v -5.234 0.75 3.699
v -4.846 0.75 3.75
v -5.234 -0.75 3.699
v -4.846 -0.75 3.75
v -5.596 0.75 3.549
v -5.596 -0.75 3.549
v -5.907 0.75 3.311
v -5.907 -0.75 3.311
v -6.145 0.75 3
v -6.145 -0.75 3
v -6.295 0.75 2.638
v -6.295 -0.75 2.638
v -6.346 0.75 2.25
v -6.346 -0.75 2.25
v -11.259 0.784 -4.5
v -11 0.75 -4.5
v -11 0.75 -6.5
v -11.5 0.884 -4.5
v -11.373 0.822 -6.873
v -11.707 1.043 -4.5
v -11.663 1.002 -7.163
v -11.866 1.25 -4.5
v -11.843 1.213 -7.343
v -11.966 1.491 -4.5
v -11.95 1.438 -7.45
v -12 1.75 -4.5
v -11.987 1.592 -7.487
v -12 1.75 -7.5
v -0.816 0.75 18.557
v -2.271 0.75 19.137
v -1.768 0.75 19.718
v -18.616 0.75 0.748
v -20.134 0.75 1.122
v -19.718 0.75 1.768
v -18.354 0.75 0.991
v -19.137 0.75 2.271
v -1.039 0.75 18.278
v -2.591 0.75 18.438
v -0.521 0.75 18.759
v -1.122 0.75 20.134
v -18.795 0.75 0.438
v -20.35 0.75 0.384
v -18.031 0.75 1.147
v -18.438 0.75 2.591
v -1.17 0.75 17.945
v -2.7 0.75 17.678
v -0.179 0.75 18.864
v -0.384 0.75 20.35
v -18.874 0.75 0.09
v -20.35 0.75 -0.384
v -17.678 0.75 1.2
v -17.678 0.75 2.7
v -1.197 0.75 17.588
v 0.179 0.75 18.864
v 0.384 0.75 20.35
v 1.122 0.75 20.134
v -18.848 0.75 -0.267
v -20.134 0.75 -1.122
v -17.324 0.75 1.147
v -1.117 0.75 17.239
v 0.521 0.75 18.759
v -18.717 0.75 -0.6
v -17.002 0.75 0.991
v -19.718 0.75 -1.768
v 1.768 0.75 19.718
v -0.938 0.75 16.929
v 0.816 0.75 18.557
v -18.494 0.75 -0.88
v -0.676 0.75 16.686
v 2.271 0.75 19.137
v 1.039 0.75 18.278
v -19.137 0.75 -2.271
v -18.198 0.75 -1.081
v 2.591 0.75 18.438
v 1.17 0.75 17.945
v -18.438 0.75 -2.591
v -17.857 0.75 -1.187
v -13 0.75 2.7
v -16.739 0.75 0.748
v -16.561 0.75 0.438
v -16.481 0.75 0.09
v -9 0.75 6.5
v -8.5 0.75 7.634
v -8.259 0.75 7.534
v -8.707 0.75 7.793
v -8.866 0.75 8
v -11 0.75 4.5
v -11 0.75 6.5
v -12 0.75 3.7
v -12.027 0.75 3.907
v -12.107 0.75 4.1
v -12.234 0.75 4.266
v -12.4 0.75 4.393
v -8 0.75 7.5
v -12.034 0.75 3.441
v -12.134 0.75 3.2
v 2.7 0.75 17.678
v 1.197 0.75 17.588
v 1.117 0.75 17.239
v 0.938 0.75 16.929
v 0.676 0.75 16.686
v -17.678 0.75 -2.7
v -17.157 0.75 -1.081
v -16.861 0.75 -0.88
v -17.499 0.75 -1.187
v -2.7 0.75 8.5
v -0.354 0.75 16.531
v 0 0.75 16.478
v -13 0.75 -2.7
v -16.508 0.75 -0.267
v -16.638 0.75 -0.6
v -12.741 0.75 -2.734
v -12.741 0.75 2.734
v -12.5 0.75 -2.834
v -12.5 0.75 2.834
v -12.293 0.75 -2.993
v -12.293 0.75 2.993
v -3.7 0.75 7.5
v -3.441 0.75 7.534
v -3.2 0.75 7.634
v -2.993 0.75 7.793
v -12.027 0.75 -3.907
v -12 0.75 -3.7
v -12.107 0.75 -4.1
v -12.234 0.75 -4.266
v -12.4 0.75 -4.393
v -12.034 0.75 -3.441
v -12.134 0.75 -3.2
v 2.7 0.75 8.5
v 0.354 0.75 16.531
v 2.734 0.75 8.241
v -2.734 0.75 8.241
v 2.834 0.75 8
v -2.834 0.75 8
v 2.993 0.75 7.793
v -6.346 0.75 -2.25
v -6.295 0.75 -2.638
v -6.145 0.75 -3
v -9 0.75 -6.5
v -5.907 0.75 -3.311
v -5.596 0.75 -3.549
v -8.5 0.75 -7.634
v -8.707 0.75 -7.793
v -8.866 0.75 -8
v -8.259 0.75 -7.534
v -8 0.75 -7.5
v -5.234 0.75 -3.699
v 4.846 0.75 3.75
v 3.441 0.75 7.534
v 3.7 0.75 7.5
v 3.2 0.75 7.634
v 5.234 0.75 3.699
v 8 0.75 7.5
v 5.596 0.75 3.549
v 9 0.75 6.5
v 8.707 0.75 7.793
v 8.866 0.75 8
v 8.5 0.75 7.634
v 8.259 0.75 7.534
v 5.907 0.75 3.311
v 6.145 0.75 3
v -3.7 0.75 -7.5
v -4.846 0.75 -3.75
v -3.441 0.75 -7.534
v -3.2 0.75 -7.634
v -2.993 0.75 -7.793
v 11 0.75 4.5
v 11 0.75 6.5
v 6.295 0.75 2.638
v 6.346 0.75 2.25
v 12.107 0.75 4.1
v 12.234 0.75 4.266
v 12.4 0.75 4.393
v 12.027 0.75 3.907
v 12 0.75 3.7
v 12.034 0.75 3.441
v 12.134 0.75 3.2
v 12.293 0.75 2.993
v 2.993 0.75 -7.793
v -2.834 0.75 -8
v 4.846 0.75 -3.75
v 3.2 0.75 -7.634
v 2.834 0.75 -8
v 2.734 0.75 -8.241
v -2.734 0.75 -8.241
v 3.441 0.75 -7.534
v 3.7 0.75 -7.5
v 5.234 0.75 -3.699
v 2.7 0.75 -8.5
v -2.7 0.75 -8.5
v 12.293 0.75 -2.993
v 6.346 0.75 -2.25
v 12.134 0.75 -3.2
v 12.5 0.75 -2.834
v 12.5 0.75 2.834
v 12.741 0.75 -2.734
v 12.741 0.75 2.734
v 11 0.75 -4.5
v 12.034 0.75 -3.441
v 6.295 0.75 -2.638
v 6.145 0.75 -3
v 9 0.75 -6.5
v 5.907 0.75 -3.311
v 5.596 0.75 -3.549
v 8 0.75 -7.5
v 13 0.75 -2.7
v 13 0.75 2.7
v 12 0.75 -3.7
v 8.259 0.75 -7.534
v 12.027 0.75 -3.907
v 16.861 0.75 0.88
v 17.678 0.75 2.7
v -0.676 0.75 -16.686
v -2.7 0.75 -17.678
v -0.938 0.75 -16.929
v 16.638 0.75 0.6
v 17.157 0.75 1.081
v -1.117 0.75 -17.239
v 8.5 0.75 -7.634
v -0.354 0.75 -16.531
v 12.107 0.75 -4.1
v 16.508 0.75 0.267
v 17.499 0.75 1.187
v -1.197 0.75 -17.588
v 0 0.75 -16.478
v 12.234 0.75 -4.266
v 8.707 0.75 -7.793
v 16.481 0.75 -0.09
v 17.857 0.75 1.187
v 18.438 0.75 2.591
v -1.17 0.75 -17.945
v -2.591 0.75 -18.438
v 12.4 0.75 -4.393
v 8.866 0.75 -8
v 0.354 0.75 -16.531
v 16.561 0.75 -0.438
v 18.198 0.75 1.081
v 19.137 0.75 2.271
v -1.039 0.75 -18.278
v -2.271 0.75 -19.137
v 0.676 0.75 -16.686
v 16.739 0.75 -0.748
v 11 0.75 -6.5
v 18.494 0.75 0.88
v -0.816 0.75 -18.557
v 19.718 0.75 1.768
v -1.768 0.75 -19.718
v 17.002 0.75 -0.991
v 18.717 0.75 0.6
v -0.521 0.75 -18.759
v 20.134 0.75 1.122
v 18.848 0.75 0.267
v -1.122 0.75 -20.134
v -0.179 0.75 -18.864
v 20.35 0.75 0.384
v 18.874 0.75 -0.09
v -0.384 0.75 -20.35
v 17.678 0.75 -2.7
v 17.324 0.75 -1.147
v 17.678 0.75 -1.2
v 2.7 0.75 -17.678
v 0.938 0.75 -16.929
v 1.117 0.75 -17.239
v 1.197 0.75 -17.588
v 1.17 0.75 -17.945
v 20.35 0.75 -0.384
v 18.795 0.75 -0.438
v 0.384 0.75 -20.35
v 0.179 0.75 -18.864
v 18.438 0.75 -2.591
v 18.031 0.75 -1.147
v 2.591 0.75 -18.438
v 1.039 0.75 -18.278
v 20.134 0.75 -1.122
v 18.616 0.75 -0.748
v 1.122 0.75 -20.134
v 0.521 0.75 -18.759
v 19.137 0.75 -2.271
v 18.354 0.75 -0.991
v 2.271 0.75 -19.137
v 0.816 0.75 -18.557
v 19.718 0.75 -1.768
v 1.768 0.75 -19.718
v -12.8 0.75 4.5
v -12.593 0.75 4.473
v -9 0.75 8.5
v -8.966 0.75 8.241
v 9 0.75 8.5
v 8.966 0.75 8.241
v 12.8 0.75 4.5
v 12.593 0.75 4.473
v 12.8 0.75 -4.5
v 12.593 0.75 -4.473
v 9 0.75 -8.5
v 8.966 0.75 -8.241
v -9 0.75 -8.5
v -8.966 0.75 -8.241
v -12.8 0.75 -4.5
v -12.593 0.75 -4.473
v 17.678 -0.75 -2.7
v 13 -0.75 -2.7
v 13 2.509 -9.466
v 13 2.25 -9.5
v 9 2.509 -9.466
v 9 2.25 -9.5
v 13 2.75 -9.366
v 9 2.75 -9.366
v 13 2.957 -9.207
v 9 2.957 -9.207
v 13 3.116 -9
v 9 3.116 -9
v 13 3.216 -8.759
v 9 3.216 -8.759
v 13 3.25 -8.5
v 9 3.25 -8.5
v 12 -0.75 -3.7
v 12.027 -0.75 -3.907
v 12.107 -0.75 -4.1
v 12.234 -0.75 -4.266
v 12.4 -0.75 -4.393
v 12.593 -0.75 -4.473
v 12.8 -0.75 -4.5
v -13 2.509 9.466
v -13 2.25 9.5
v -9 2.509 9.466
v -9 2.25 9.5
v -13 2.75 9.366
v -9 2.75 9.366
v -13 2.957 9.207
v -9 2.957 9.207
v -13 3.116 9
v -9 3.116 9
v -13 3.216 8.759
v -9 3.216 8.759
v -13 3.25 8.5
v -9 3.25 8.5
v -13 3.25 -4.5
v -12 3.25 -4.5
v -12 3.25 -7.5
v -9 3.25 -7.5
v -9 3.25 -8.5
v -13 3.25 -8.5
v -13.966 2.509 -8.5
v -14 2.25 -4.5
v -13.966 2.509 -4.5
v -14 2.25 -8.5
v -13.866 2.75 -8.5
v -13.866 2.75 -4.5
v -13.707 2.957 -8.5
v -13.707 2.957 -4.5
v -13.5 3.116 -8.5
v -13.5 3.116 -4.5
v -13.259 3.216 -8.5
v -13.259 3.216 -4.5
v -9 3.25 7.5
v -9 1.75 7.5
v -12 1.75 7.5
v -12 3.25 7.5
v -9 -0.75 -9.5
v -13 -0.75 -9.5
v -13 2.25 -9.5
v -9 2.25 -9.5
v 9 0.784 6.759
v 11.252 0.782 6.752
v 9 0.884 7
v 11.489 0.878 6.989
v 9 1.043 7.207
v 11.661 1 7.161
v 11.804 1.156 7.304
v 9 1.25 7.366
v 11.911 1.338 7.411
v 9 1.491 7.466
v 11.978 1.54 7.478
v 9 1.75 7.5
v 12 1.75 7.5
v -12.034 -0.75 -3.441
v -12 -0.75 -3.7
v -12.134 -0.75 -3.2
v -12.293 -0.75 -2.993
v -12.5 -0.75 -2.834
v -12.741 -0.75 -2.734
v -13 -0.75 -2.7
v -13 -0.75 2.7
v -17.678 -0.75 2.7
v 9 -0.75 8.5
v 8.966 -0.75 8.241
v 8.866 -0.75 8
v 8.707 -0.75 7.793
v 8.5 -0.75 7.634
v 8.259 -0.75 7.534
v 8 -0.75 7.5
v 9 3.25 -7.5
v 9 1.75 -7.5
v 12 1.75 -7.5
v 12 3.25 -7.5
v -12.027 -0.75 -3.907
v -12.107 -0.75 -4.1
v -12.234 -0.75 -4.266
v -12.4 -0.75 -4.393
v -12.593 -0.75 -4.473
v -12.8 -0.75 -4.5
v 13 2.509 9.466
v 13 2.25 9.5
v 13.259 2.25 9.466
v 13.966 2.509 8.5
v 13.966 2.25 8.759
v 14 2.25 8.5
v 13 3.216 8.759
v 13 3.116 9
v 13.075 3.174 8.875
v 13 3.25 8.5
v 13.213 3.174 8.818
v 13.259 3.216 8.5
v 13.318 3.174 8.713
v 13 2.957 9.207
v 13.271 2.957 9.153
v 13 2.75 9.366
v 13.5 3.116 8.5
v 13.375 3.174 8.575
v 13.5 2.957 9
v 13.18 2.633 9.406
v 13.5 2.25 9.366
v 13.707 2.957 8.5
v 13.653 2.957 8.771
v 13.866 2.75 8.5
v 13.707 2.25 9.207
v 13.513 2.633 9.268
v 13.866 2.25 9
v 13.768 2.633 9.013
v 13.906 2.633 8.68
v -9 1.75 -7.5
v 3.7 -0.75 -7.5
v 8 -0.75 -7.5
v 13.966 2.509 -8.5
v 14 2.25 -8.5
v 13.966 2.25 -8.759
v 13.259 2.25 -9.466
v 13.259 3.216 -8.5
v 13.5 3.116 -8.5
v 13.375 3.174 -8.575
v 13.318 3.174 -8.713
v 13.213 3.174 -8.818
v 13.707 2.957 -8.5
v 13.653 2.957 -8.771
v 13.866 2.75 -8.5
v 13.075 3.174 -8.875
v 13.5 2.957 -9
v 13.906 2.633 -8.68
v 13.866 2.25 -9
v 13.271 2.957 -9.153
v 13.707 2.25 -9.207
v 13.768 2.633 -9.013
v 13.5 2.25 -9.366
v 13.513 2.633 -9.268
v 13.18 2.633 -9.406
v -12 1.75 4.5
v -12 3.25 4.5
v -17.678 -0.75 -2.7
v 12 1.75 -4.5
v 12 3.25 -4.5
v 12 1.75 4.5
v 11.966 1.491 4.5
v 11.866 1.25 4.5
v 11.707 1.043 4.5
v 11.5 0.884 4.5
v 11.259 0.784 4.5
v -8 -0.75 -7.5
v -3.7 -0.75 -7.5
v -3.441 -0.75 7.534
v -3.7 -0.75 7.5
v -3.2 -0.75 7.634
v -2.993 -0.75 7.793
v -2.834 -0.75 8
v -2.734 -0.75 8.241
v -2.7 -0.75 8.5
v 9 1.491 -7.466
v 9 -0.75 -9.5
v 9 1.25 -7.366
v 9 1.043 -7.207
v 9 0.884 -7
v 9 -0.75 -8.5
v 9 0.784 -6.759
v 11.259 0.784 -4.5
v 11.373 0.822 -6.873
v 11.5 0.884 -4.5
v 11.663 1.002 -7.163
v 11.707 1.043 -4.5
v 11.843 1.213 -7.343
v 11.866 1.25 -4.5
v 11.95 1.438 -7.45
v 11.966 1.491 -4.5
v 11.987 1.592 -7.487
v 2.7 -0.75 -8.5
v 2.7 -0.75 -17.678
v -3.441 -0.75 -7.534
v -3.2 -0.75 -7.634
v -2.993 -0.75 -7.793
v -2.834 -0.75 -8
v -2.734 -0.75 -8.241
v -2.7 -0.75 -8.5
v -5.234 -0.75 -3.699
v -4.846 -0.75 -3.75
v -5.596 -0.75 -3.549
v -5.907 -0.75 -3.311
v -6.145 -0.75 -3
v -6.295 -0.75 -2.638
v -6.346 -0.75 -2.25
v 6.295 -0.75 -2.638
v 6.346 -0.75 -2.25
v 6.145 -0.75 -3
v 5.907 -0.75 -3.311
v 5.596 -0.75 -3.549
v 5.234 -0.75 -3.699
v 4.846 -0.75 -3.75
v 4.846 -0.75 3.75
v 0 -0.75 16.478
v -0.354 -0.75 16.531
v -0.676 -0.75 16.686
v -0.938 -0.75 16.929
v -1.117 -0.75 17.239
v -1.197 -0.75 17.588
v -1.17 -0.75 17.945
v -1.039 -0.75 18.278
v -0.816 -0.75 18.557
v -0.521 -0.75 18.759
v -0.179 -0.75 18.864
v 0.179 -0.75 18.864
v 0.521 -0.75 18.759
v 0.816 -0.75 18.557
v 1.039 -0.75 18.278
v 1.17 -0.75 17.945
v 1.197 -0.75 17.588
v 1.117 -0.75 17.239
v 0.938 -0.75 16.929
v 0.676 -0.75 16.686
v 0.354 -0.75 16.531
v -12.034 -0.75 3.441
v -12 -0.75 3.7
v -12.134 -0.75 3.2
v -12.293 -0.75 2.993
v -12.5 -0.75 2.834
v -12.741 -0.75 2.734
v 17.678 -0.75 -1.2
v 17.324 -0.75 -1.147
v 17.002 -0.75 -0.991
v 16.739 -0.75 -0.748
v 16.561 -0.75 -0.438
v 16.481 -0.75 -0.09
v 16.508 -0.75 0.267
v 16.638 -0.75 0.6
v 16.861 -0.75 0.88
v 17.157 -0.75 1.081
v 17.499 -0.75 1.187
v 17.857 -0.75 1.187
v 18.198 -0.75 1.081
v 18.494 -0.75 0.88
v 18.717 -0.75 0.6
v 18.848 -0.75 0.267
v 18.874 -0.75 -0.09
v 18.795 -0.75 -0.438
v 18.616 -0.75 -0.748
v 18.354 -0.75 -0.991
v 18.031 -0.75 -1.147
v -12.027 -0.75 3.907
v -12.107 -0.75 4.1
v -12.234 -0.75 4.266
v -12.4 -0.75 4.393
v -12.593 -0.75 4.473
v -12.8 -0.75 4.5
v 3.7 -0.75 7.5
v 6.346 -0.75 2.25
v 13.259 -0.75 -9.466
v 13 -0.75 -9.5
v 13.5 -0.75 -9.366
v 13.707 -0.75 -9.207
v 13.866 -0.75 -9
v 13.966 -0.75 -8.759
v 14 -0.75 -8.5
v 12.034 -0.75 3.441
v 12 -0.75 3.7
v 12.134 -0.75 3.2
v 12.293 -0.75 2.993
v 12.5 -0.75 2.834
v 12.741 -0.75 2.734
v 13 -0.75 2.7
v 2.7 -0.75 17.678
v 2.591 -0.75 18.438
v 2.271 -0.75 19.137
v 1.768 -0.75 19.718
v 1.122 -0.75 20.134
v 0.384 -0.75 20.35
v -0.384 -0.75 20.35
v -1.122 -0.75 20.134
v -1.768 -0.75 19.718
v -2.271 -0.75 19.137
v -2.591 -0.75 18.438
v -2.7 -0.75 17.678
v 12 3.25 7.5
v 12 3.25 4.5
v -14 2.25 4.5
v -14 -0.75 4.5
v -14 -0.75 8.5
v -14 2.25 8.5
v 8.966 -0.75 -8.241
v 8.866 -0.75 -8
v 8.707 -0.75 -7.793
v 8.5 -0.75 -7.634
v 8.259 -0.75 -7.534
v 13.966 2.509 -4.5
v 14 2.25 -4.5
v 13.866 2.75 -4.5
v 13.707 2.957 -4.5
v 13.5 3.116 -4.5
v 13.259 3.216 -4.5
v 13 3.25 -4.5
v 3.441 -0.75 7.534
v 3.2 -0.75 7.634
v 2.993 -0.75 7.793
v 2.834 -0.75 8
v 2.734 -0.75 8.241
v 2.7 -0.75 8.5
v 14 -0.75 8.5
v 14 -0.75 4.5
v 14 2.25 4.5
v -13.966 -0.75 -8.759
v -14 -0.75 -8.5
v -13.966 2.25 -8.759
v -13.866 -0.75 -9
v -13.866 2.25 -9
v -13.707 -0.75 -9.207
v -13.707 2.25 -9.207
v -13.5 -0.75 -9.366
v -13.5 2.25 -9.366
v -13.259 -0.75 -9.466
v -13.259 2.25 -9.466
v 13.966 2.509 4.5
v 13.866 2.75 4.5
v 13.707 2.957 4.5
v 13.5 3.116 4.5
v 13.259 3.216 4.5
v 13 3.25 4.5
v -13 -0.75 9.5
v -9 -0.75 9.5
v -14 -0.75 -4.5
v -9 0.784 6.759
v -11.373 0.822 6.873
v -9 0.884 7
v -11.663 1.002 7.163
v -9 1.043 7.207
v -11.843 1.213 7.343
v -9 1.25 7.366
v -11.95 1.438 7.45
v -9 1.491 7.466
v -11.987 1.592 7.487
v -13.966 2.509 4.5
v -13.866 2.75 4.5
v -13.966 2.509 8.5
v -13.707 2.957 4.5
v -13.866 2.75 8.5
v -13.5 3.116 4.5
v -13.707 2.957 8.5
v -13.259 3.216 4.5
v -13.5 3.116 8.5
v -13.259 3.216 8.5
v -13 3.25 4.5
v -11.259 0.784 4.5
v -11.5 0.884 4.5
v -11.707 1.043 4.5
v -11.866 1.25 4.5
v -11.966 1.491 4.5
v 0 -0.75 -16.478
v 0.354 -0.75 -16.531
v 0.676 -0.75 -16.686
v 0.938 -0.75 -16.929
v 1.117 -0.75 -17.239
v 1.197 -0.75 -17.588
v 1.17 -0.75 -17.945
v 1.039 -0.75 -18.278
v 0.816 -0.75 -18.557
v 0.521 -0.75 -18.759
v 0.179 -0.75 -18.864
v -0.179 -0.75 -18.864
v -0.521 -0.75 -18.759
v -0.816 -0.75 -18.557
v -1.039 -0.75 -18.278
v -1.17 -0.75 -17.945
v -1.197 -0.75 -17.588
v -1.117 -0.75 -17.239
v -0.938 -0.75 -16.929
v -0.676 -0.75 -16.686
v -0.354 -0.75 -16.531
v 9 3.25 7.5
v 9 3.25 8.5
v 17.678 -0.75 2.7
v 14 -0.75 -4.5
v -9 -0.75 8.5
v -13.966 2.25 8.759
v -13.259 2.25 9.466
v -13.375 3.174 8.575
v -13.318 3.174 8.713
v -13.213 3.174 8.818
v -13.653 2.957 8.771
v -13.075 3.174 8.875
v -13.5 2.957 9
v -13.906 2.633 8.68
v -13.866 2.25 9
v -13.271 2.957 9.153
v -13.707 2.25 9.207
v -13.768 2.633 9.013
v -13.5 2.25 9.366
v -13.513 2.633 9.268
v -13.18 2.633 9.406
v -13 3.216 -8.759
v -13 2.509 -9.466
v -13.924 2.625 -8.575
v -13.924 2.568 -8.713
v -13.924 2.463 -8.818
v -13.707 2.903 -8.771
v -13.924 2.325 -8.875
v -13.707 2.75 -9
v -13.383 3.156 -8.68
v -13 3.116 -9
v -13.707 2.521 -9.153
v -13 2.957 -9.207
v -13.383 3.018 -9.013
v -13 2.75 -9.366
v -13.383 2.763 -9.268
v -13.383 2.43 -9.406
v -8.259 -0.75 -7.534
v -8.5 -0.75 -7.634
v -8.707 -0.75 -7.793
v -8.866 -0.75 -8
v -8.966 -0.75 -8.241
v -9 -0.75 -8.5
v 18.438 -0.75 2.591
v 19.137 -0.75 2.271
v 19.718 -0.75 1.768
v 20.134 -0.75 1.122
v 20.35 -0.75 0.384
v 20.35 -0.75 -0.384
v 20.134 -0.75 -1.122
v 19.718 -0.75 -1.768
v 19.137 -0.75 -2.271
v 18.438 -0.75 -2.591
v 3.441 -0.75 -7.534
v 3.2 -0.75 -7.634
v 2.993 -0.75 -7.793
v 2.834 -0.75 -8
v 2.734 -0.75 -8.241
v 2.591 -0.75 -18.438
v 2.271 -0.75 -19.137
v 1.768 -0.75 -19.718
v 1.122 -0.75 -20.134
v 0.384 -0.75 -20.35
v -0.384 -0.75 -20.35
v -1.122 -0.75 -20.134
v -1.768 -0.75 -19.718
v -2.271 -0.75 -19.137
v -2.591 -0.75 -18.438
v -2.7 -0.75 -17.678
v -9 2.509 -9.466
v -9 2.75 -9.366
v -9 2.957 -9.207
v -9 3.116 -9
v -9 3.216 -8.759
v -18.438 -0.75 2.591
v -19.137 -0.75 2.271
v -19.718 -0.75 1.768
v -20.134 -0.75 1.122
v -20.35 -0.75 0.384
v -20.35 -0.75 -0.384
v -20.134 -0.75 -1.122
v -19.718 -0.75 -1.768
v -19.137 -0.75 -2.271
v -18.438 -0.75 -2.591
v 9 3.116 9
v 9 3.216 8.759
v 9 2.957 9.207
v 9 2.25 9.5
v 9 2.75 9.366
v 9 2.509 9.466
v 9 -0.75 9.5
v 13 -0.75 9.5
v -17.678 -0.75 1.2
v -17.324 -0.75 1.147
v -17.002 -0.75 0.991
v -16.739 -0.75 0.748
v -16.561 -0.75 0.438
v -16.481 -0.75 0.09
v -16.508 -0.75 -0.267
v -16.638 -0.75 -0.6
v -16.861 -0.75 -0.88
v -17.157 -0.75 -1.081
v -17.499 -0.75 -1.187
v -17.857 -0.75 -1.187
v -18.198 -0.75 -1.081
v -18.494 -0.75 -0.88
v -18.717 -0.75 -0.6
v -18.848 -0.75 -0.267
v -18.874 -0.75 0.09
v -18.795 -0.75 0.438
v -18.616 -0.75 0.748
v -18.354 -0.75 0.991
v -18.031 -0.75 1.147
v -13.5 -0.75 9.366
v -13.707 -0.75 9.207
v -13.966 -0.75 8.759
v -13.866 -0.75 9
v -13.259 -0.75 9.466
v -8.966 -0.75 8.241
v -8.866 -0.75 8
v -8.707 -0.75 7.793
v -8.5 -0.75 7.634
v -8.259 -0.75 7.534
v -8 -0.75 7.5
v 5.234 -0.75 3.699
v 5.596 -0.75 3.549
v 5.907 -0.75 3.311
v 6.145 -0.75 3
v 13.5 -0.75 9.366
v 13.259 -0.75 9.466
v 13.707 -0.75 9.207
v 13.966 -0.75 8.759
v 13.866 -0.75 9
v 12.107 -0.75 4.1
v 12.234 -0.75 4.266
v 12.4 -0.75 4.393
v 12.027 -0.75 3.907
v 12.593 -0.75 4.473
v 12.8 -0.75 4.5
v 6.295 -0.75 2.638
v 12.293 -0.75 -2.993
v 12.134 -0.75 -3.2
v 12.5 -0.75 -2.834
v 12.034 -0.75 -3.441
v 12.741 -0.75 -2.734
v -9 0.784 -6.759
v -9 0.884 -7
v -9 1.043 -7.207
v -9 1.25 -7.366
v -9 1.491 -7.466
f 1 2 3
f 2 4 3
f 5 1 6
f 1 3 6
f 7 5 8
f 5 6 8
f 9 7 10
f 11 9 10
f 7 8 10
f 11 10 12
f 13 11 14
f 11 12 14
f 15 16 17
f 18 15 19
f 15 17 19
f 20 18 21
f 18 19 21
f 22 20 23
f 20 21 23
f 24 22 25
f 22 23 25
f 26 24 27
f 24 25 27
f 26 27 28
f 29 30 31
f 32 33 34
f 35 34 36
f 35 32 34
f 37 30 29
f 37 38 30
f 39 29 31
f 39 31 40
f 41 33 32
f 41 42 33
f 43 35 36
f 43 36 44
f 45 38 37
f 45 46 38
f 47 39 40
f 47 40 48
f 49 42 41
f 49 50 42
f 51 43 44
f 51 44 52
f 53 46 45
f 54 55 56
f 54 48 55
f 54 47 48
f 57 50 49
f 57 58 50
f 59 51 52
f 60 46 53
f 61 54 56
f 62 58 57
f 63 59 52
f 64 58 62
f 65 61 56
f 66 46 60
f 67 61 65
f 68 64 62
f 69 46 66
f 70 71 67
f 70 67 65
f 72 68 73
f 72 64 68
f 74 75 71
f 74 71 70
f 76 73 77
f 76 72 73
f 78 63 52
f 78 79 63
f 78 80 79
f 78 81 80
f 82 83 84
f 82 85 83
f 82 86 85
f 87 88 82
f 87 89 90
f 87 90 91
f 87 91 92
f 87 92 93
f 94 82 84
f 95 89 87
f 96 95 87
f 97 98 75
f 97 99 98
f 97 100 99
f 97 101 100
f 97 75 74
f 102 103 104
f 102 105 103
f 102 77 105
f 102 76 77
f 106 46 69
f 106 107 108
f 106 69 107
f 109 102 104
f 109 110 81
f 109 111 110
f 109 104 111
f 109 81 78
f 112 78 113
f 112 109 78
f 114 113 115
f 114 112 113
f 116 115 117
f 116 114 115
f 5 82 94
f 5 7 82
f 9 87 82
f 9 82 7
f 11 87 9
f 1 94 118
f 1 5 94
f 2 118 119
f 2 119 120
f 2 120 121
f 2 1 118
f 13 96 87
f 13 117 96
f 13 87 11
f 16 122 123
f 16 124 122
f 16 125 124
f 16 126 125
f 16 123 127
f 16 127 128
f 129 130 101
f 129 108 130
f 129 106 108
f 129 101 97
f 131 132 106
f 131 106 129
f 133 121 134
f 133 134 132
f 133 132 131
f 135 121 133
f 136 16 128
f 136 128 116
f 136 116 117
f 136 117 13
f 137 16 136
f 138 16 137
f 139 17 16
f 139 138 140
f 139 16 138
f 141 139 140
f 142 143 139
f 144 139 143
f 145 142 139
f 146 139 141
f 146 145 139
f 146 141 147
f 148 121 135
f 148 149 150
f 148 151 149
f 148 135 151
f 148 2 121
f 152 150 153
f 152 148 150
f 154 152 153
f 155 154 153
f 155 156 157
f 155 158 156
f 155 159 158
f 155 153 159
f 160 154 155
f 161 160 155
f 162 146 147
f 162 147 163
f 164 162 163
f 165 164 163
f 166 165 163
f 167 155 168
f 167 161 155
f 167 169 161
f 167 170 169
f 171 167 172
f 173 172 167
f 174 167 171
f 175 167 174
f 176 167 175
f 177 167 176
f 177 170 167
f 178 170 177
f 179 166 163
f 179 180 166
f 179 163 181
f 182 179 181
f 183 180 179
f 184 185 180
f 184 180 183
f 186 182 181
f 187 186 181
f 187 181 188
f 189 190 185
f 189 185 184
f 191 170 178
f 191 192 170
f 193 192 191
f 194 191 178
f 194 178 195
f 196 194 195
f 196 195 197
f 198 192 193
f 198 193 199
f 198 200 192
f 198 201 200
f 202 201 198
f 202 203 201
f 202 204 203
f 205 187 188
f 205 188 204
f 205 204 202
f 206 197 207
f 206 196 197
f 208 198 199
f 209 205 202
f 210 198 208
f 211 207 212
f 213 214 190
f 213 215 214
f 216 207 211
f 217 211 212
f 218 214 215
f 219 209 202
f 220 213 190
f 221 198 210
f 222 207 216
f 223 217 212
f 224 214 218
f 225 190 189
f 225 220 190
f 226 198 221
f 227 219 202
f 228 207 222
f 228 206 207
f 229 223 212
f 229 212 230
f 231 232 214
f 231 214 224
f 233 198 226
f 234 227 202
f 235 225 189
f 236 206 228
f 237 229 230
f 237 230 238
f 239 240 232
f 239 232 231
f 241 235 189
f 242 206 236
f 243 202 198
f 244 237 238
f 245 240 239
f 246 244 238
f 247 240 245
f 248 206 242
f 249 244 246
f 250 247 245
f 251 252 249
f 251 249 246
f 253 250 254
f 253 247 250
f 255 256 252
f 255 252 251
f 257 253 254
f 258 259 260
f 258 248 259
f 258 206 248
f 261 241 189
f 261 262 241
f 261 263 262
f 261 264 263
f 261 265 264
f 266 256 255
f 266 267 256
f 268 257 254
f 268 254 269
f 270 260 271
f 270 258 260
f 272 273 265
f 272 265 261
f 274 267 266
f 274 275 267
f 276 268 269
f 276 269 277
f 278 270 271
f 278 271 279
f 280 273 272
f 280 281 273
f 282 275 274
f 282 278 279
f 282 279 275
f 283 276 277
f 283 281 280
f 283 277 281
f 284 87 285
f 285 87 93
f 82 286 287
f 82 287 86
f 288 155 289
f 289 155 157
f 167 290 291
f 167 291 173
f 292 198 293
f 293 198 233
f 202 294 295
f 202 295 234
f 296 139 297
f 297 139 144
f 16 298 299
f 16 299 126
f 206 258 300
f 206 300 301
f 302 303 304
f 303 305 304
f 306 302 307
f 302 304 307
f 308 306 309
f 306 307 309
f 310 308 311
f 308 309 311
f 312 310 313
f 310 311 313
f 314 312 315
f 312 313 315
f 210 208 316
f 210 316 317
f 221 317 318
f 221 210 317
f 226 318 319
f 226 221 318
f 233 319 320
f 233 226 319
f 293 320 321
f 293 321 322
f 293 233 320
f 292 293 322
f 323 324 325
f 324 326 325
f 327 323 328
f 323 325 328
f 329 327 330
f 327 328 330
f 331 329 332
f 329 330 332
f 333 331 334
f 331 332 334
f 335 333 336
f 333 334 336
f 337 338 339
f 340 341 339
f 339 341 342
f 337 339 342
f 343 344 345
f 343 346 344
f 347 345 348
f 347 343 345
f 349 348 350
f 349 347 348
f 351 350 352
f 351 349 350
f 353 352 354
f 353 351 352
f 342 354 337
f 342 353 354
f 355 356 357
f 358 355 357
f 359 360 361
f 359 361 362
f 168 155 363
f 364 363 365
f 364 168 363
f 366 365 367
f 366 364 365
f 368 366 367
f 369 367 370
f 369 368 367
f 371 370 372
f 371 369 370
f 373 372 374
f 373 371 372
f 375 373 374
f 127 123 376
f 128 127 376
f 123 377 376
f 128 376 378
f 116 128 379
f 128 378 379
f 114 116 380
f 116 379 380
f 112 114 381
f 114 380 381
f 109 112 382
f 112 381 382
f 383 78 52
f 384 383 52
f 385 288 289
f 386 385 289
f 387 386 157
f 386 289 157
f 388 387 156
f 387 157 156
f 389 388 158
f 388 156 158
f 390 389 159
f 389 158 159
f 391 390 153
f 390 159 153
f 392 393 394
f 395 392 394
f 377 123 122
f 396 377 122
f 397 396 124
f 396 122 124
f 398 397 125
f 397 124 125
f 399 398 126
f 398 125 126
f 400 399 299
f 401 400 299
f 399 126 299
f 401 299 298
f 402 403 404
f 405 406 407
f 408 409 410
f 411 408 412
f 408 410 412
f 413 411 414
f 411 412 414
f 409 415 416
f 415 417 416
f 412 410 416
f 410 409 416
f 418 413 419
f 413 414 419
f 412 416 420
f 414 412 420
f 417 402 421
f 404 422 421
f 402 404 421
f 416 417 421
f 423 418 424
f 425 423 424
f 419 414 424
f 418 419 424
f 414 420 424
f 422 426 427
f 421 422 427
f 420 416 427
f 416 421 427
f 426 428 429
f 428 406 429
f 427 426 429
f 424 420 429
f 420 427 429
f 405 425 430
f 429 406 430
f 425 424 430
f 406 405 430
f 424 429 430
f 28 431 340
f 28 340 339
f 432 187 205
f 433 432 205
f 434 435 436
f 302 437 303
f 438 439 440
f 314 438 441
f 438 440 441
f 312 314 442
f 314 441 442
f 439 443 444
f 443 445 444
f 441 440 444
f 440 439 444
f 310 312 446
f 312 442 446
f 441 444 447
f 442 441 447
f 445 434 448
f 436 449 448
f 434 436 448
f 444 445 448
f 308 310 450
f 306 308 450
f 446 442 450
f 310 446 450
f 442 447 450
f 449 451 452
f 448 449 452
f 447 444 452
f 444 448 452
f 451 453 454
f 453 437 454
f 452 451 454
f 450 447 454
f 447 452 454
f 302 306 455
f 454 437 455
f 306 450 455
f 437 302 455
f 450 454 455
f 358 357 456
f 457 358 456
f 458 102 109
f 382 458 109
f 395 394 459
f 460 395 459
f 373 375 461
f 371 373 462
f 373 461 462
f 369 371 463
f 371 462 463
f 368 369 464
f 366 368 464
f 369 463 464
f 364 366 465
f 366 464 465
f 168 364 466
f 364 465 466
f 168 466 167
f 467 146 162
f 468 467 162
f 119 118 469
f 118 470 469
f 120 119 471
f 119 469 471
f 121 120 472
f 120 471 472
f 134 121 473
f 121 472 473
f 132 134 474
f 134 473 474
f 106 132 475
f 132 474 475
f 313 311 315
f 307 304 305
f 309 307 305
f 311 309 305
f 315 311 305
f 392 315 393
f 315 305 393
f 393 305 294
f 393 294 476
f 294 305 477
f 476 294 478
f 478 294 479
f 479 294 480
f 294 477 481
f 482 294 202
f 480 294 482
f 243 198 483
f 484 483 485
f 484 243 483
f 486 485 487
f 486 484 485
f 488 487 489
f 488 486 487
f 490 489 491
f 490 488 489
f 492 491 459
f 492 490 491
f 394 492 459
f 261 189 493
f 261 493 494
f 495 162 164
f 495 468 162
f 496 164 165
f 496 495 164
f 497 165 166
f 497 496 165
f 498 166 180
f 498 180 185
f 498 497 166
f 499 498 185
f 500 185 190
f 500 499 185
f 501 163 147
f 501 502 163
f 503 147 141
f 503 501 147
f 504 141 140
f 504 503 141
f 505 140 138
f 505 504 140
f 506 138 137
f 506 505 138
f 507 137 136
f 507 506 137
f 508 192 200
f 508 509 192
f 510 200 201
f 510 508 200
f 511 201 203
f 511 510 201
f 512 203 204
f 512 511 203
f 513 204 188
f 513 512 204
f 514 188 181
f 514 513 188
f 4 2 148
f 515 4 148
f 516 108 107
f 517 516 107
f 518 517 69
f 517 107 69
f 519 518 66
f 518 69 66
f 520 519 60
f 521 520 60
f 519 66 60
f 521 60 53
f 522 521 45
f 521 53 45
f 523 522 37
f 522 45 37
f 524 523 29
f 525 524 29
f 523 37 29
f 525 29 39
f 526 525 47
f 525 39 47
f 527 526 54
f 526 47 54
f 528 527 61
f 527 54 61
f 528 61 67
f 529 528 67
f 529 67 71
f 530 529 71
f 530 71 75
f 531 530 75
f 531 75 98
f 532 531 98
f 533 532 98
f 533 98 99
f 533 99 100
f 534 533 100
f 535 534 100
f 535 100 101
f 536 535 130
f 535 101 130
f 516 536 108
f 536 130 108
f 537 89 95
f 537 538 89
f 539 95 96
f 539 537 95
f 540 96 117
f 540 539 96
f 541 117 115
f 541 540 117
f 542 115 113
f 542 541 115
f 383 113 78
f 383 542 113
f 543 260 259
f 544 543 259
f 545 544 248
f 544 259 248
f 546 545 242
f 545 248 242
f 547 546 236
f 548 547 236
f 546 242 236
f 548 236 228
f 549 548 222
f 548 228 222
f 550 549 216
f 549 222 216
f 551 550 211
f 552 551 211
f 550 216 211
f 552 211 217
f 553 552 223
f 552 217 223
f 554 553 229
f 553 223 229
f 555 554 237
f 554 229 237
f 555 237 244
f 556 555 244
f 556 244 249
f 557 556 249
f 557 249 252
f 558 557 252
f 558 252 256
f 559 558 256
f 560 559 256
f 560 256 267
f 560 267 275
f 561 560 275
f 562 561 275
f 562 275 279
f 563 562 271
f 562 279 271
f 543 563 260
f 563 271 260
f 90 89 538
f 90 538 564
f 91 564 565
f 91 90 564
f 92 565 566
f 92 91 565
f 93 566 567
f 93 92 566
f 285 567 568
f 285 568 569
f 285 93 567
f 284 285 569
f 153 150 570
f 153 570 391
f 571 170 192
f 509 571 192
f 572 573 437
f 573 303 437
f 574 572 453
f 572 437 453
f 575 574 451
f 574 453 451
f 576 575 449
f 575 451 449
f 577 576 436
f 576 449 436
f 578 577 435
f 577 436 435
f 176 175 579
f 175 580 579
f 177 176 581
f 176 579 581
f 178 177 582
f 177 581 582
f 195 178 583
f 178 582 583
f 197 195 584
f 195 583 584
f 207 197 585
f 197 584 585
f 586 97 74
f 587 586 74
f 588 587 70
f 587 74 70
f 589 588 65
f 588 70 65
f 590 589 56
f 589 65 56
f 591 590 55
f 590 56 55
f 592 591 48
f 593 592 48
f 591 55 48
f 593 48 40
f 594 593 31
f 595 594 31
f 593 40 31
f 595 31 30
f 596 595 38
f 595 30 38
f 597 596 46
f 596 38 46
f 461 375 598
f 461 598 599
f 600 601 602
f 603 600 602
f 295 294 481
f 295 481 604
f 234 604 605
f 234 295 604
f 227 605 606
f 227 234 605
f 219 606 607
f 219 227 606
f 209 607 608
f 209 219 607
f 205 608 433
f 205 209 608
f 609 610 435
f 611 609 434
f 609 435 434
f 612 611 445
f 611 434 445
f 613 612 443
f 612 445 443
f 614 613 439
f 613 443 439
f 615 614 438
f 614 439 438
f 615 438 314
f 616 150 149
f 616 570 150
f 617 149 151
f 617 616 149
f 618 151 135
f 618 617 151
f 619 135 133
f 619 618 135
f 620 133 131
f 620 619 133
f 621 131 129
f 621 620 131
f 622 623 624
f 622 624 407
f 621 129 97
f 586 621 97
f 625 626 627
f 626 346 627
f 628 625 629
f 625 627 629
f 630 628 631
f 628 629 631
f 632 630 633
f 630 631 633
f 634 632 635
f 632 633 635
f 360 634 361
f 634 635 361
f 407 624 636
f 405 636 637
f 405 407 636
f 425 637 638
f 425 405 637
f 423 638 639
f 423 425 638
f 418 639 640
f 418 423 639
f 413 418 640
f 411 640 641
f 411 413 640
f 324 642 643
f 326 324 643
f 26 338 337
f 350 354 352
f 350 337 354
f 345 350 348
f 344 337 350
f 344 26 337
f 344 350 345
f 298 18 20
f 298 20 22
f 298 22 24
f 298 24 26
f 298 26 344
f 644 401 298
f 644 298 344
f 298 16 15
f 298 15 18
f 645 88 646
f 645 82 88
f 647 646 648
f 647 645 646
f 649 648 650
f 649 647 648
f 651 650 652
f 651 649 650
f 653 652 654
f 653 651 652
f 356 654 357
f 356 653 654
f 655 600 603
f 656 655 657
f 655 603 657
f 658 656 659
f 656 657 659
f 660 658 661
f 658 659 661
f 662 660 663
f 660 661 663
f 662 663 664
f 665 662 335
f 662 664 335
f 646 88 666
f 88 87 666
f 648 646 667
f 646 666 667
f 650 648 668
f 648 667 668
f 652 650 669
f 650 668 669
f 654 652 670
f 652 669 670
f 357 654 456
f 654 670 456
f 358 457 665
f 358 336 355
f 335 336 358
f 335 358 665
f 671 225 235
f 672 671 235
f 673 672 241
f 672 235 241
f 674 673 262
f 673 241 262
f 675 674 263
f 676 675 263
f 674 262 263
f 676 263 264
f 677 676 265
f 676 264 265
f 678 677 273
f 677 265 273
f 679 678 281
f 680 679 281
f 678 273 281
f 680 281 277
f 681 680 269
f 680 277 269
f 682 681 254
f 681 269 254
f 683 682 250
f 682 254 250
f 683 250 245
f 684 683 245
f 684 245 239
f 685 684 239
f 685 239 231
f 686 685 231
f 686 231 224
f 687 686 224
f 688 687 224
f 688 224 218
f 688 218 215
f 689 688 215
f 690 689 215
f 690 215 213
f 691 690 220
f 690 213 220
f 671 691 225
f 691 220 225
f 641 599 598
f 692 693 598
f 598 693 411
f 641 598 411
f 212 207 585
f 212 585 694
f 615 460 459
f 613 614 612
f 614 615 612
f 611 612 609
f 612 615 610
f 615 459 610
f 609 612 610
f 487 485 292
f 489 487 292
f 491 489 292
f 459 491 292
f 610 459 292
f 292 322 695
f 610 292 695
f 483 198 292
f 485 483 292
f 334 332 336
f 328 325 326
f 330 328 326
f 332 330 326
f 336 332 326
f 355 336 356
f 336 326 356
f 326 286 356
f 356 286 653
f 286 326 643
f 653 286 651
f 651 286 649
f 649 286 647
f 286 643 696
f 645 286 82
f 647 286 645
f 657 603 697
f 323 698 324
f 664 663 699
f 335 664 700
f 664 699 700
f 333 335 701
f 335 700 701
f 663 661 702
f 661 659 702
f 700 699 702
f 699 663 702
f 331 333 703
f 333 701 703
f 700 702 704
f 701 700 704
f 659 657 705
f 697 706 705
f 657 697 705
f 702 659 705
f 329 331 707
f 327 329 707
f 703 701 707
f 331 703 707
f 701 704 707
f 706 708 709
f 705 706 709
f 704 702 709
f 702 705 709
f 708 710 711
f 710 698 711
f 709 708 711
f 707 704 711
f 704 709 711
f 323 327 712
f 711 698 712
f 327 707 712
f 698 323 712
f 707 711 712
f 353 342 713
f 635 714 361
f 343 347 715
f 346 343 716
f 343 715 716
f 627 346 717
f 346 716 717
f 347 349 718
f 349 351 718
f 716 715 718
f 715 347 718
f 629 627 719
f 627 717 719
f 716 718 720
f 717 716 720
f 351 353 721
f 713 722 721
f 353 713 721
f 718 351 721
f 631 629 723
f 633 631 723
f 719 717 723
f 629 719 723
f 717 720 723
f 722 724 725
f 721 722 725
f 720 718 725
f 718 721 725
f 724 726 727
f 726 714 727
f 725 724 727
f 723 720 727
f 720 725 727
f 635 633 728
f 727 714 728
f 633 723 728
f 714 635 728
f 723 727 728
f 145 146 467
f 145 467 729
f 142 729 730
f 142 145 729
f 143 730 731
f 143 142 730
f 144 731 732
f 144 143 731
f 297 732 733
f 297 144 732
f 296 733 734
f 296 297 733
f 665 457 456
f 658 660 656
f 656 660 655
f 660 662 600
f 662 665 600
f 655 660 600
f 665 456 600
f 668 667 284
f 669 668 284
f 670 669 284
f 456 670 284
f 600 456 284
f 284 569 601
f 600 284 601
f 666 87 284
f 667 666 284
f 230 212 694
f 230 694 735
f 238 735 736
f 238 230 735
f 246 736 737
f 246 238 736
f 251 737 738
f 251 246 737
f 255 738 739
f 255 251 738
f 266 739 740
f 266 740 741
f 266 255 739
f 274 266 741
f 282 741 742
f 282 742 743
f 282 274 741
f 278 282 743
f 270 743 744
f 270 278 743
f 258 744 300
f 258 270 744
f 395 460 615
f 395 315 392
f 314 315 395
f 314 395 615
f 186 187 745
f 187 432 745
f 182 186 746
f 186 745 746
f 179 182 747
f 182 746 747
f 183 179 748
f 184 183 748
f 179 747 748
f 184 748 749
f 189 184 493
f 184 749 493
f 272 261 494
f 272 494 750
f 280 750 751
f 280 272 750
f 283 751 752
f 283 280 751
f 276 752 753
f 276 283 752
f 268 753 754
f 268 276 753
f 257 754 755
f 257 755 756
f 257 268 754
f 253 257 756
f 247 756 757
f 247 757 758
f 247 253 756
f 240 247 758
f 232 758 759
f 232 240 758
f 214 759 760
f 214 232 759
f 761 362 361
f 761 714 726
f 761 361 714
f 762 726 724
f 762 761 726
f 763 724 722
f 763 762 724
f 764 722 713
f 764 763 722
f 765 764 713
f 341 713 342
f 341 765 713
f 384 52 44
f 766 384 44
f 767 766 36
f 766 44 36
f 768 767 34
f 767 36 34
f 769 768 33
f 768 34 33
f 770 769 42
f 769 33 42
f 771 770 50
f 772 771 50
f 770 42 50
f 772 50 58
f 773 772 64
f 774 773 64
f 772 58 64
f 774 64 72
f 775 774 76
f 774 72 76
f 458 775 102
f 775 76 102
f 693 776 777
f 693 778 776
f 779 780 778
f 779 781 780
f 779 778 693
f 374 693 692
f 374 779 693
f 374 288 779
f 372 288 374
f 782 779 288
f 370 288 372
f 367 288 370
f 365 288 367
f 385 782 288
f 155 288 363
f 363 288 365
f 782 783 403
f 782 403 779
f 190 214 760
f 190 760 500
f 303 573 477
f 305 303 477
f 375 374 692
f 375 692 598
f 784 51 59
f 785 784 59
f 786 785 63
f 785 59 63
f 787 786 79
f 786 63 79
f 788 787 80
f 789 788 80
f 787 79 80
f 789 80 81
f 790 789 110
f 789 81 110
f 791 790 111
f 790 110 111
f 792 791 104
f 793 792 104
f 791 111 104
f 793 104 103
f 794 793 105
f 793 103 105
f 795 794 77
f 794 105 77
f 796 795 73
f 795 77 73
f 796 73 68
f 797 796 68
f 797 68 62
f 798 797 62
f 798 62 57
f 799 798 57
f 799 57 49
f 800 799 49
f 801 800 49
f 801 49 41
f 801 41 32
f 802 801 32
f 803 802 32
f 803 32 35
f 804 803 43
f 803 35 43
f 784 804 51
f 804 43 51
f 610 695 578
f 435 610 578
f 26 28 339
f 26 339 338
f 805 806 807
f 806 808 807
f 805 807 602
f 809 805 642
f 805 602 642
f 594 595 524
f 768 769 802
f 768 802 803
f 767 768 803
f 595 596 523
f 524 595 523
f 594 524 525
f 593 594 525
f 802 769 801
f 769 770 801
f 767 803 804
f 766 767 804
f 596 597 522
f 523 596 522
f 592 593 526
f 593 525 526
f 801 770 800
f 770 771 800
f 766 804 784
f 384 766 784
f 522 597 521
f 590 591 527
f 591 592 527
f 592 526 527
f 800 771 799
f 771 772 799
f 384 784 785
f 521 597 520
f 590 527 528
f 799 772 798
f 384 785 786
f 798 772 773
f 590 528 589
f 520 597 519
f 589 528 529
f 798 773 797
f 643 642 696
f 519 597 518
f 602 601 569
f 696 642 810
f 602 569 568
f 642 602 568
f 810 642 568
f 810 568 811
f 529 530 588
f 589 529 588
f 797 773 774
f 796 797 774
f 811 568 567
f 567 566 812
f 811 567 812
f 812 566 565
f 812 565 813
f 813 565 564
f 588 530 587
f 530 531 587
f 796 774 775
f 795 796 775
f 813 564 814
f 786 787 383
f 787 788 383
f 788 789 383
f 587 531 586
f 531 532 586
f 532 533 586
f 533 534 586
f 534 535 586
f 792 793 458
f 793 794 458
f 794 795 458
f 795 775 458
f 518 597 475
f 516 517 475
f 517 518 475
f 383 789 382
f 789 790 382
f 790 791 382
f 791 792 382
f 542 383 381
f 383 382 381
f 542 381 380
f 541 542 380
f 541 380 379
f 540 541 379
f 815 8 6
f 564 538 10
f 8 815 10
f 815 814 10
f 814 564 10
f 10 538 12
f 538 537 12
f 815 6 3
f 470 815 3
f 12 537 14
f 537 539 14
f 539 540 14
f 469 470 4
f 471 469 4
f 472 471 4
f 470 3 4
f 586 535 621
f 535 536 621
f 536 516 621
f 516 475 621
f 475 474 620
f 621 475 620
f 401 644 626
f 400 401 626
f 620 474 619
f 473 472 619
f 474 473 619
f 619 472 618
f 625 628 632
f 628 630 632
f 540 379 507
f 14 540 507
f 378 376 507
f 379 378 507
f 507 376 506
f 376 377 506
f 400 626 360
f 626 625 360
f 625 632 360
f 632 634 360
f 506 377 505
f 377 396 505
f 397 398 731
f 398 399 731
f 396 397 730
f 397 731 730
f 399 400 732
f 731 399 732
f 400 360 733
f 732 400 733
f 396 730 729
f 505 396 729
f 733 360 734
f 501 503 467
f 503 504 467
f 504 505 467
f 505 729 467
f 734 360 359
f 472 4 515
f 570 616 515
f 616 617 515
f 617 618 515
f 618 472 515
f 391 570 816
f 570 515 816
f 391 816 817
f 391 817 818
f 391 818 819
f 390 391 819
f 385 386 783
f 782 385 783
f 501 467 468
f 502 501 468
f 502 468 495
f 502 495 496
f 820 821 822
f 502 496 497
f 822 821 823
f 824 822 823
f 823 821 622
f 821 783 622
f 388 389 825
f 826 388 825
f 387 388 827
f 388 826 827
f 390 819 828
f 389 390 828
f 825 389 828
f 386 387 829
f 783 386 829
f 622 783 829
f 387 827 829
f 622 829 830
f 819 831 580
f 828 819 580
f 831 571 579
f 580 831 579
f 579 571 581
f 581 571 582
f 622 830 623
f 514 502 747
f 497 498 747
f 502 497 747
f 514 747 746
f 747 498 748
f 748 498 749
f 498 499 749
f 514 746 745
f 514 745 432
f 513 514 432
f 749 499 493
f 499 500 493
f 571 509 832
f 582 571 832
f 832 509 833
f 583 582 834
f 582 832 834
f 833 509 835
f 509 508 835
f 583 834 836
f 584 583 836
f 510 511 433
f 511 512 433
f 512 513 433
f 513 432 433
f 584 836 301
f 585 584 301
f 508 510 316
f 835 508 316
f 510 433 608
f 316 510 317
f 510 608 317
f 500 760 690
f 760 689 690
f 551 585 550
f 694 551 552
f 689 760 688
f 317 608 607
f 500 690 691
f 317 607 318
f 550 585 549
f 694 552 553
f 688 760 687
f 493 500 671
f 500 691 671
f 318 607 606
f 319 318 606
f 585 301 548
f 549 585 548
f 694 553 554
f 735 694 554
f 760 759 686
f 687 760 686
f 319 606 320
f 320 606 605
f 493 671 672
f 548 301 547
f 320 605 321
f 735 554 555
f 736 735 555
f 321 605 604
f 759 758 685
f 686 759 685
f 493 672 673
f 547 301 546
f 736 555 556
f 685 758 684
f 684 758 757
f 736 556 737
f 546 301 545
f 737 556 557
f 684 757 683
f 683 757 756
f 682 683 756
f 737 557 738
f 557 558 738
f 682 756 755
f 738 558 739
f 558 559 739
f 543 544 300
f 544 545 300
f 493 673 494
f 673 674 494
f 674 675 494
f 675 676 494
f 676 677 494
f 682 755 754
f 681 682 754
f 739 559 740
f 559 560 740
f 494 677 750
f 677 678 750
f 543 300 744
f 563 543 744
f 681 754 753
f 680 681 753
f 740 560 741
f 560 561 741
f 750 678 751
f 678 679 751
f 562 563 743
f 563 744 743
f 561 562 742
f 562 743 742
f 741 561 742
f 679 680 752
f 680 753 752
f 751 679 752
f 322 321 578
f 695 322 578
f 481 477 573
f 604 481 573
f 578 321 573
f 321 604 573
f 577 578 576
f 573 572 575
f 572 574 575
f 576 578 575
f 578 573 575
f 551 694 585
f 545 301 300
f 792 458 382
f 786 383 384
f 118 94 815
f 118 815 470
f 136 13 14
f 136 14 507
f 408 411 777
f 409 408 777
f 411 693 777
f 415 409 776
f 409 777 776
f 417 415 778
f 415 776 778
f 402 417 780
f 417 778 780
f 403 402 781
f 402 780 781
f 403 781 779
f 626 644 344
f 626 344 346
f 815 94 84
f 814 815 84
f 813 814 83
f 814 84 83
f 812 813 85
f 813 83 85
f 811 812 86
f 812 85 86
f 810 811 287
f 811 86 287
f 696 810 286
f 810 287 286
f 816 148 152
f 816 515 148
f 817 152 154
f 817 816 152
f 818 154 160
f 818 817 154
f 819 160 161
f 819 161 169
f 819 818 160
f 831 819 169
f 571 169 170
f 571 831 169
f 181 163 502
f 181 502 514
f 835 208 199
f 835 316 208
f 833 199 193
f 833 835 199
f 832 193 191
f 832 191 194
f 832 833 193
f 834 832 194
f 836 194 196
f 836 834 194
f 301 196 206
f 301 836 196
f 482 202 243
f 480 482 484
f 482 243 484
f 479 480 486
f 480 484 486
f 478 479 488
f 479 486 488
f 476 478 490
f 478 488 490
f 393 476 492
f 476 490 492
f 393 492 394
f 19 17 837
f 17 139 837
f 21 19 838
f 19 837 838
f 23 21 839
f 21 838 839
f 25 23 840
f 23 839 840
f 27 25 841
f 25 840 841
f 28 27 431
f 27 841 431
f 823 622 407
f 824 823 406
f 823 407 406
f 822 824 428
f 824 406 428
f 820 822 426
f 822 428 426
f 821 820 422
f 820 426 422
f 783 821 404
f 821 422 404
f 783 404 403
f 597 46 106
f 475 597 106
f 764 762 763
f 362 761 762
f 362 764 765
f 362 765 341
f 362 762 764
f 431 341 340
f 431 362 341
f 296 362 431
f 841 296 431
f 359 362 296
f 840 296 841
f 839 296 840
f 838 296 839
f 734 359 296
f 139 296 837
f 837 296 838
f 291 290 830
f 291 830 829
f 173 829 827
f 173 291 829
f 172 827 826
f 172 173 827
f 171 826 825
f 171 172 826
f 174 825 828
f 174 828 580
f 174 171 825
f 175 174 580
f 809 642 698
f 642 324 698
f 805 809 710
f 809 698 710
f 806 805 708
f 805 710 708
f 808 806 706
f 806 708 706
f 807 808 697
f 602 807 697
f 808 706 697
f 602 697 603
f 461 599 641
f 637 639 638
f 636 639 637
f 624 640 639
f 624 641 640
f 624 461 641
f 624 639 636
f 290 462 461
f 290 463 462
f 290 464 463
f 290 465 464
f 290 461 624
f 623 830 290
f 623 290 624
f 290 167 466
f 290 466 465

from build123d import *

# Parameters (mm, degrees)
SKETCH1_W            = 24
SKETCH1_H            = 15
BOSS_EXTRUDE1_DEPTH  = 0.75
BOSS_EXTRUDE2_START  = -1.5
BOSS_EXTRUDE2_DEPTH  = 4
MIRROR2_START        = -1.5
MIRROR2_COPY_1_DEPTH = 4
SKETCH3_R            = 1.2
BOSS_EXTRUDE3_DEPTH  = 1.5
FILLET1_R            = 1
BOSS_EXTRUDE4_DEPTH  = 1.5
SKETCH5_W            = 12.692307692
SKETCH5_H            = 7.5
CUT_EXTRUDE1_DEPTH   = 1.5
FILLET2_R            = 1.5


with BuildPart() as part:
    # Sketch1 → Boss-Extrude1 (new, symmetric)
    with BuildSketch(Plane(origin=(0, 0, 0), x_dir=(1, 0, 0), z_dir=(0, 1, 0))):
        Rectangle(SKETCH1_W, SKETCH1_H)
    extrude(amount=BOSS_EXTRUDE1_DEPTH, both=True)

    # Sketch2 → Boss-Extrude2 (add)
    with BuildSketch(Plane(origin=(0, 0.75, 0), x_dir=(1, 0, 0), z_dir=(0, 1, 0)).offset(BOSS_EXTRUDE2_START)):
        Polygon((-12, 4.5), (-14, 4.5), (-14, 9.5), (-9, 9.5), (-9, 7.5), (-12, 7.5), align=None)
    boss_extrude2 = extrude(amount=BOSS_EXTRUDE2_DEPTH)

    # Mirror1: Boss-Extrude2 across plane
    add(boss_extrude2.mirror(Plane(origin=(0, 0, 0), x_dir=(0, 0, 1), z_dir=(1, 0, 0))))

    # Mirror2: Boss-Extrude2 across plane
    add(boss_extrude2.mirror(Plane.XY))

    # Mirror2 copy 1 sketch → Mirror2 copy 1 (add)
    with BuildSketch(Plane(origin=(0, 0.75, 0), x_dir=(-1, 0, 0), z_dir=(0, 1, 0)).offset(MIRROR2_START)):
        Polygon((-12, 4.5), (-14, 4.5), (-14, 9.5), (-9, 9.5), (-9, 7.5), (-12, 7.5), align=None)
    extrude(amount=MIRROR2_COPY_1_DEPTH)

    # Sketch3 → Boss-Extrude3 (add)
    # profile 1 of 4: a face of its own
    with BuildSketch(Plane(origin=(0, 0.75, 0), x_dir=(1, 0, 0), z_dir=(0, 1, 0))):
        with BuildLine():
            Line((-17.67766953, 2.7), (-12, 2.7))
            Line((-12, 2.7), (-12, -2.7))
            Line((-12, -2.7), (-17.67766953, -2.7))
            ThreePointArc((-17.67766953, -2.7), (-20.37766953, 0), (-17.67766953, 2.7))
        make_face()
        with Locations(Location((-17.67766953, 0, 0), (0, 0, 270))):
            Circle(SKETCH3_R, mode=Mode.SUBTRACT)
    # profile 2 of 4: a face of its own
    with BuildSketch(Plane(origin=(0, 0.75, 0), x_dir=(1, 0, 0), z_dir=(0, 1, 0))):
        with BuildLine():
            Line((-2.7, 17.67766953), (-2.7, 7.5))
            Line((-2.7, 7.5), (2.7, 7.5))
            Line((2.7, 7.5), (2.7, 17.67766953))
            ThreePointArc((2.7, 17.67766953), (0, 20.37766953), (-2.7, 17.67766953))
        make_face()
        with Locations(Location((0, 17.67766953, 0), (0, 0, 270))):
            Circle(SKETCH3_R, mode=Mode.SUBTRACT)
    # profile 3 of 4: a face of its own
    with BuildSketch(Plane(origin=(0, 0.75, 0), x_dir=(1, 0, 0), z_dir=(0, 1, 0))):
        with BuildLine():
            Line((12, -2.7), (17.67766953, -2.7))
            ThreePointArc((17.67766953, -2.7), (20.37766953, 0), (17.67766953, 2.7))
            Line((17.67766953, 2.7), (12, 2.7))
            Line((12, 2.7), (12, -2.7))
        make_face()
        with Locations(Location((17.67766953, 0, 0), (0, 0, 90))):
            Circle(SKETCH3_R, mode=Mode.SUBTRACT)
    # profile 4 of 4: a face of its own
    with BuildSketch(Plane(origin=(0, 0.75, 0), x_dir=(1, 0, 0), z_dir=(0, 1, 0))):
        with BuildLine():
            Line((-2.7, -7.5), (2.7, -7.5))
            Line((2.7, -7.5), (2.7, -17.67766953))
            ThreePointArc((2.7, -17.67766953), (0, -20.37766953), (-2.7, -17.67766953))
            Line((-2.7, -17.67766953), (-2.7, -7.5))
        make_face()
        with Locations(Location((0, -17.67766953, 0), (0, 0, 90))):
            Circle(SKETCH3_R, mode=Mode.SUBTRACT)
    extrude(amount=-BOSS_EXTRUDE3_DEPTH)

    # Fillet1
    fillet1_edges = [part.edges().sort_by_distance(p)[0] for p in [
        (-14, 1.25, 9.5),
        (-14, 3.25, 7),
        (-11.5, 3.25, 9.5),
        (14, 1.25, 9.5),
        (11.5, 3.25, 9.5),
        (14, 3.25, 7),
        (14, 1.25, -9.5),
        (14, 3.25, -7),
        (11.5, 3.25, -9.5),
        (-11.5, 3.25, -9.5),
        (-14, 3.25, -7),
        (-14, 1.25, -9.5),
        (-10.5, 0.75, -7.5),
        (-12, 0.75, -6),
        (10.5, 0.75, -7.5),
        (12, 0.75, -6),
        (12, 0.75, 6),
        (10.5, 0.75, 7.5),
        (-10.5, 0.75, 7.5),
        (-12, 0.75, 6),
        (2.7, 0, -7.5),
        (-2.7, 0, -7.5),
        (-2.7, 0, 7.5),
        (2.7, 0, 7.5),
        (12, 0, 2.7),
        (12, 0, -2.7),
        (-12, 0, 2.7),
        (-12, 0, -2.7),
    ]]
    fillet(fillet1_edges, radius=FILLET1_R)

    # Sketch4 → Boss-Extrude4 (add)
    with BuildSketch(Plane(origin=(0, 0.75, 0), x_dir=(1, 0, 0), z_dir=(0, 1, 0))):
        with BuildLine():
            Line((-12.8, -4.5), (-12, -4.5))
            Line((-12, -4.5), (-12, -3.7))
            ThreePointArc((-12, -3.7), (-12.234314575, -4.265685425), (-12.8, -4.5))
        make_face()
        with BuildLine():
            Line((-12.8, 4.5), (-12, 4.5))
            Line((-12, 4.5), (-12, 3.7))
            ThreePointArc((-12, 3.7), (-12.234314575, 4.265685425), (-12.8, 4.5))
        make_face()
        with BuildLine():
            Line((12.8, 4.5), (12, 4.5))
            Line((12, 4.5), (12, 3.7))
            ThreePointArc((12, 3.7), (12.234314575, 4.265685425), (12.8, 4.5))
        make_face()
        with BuildLine():
            Line((12, -3.7), (12, -4.5))
            Line((12, -4.5), (12.8, -4.5))
            ThreePointArc((12.8, -4.5), (12.234314575, -4.265685425), (12, -3.7))
        make_face()
        with BuildLine():
            Line((-9, 8.5), (-9, 7.5))
            Line((-9, 7.5), (-8, 7.5))
            ThreePointArc((-8, 7.5), (-8.707106781, 7.792893219), (-9, 8.5))
        make_face()
        with BuildLine():
            Line((8, 7.5), (9, 7.5))
            Line((9, 7.5), (9, 8.5))
            ThreePointArc((9, 8.5), (8.707106781, 7.792893219), (8, 7.5))
        make_face()
        with BuildLine():
            Line((8, -7.5), (9, -7.5))
            Line((9, -7.5), (9, -8.5))
            ThreePointArc((9, -8.5), (8.707106781, -7.792893219), (8, -7.5))
        make_face()
        with BuildLine():
            Line((-9, -8.5), (-9, -7.5))
            Line((-9, -7.5), (-8, -7.5))
            ThreePointArc((-8, -7.5), (-8.707106781, -7.792893219), (-9, -8.5))
        make_face()
    extrude(amount=-BOSS_EXTRUDE4_DEPTH)

    # Sketch5 → Cut-Extrude1 (cut)
    with BuildSketch(Plane(origin=(0, 0.75, 0), x_dir=(1, 0, 0), z_dir=(0, 1, 0))):
        Rectangle(SKETCH5_W, SKETCH5_H)
    extrude(amount=-CUT_EXTRUDE1_DEPTH, mode=Mode.SUBTRACT)

    # Fillet2
    fillet2_edges = [part.edges().sort_by_distance(p)[0] for p in [
        (6.346153846, 0, 3.75),
        (6.346153846, 0, -3.75),
        (-6.346153846, 0, -3.75),
        (-6.346153846, 0, 3.75),
    ]]
    fillet(fillet2_edges, radius=FILLET2_R)


solid = part.part
